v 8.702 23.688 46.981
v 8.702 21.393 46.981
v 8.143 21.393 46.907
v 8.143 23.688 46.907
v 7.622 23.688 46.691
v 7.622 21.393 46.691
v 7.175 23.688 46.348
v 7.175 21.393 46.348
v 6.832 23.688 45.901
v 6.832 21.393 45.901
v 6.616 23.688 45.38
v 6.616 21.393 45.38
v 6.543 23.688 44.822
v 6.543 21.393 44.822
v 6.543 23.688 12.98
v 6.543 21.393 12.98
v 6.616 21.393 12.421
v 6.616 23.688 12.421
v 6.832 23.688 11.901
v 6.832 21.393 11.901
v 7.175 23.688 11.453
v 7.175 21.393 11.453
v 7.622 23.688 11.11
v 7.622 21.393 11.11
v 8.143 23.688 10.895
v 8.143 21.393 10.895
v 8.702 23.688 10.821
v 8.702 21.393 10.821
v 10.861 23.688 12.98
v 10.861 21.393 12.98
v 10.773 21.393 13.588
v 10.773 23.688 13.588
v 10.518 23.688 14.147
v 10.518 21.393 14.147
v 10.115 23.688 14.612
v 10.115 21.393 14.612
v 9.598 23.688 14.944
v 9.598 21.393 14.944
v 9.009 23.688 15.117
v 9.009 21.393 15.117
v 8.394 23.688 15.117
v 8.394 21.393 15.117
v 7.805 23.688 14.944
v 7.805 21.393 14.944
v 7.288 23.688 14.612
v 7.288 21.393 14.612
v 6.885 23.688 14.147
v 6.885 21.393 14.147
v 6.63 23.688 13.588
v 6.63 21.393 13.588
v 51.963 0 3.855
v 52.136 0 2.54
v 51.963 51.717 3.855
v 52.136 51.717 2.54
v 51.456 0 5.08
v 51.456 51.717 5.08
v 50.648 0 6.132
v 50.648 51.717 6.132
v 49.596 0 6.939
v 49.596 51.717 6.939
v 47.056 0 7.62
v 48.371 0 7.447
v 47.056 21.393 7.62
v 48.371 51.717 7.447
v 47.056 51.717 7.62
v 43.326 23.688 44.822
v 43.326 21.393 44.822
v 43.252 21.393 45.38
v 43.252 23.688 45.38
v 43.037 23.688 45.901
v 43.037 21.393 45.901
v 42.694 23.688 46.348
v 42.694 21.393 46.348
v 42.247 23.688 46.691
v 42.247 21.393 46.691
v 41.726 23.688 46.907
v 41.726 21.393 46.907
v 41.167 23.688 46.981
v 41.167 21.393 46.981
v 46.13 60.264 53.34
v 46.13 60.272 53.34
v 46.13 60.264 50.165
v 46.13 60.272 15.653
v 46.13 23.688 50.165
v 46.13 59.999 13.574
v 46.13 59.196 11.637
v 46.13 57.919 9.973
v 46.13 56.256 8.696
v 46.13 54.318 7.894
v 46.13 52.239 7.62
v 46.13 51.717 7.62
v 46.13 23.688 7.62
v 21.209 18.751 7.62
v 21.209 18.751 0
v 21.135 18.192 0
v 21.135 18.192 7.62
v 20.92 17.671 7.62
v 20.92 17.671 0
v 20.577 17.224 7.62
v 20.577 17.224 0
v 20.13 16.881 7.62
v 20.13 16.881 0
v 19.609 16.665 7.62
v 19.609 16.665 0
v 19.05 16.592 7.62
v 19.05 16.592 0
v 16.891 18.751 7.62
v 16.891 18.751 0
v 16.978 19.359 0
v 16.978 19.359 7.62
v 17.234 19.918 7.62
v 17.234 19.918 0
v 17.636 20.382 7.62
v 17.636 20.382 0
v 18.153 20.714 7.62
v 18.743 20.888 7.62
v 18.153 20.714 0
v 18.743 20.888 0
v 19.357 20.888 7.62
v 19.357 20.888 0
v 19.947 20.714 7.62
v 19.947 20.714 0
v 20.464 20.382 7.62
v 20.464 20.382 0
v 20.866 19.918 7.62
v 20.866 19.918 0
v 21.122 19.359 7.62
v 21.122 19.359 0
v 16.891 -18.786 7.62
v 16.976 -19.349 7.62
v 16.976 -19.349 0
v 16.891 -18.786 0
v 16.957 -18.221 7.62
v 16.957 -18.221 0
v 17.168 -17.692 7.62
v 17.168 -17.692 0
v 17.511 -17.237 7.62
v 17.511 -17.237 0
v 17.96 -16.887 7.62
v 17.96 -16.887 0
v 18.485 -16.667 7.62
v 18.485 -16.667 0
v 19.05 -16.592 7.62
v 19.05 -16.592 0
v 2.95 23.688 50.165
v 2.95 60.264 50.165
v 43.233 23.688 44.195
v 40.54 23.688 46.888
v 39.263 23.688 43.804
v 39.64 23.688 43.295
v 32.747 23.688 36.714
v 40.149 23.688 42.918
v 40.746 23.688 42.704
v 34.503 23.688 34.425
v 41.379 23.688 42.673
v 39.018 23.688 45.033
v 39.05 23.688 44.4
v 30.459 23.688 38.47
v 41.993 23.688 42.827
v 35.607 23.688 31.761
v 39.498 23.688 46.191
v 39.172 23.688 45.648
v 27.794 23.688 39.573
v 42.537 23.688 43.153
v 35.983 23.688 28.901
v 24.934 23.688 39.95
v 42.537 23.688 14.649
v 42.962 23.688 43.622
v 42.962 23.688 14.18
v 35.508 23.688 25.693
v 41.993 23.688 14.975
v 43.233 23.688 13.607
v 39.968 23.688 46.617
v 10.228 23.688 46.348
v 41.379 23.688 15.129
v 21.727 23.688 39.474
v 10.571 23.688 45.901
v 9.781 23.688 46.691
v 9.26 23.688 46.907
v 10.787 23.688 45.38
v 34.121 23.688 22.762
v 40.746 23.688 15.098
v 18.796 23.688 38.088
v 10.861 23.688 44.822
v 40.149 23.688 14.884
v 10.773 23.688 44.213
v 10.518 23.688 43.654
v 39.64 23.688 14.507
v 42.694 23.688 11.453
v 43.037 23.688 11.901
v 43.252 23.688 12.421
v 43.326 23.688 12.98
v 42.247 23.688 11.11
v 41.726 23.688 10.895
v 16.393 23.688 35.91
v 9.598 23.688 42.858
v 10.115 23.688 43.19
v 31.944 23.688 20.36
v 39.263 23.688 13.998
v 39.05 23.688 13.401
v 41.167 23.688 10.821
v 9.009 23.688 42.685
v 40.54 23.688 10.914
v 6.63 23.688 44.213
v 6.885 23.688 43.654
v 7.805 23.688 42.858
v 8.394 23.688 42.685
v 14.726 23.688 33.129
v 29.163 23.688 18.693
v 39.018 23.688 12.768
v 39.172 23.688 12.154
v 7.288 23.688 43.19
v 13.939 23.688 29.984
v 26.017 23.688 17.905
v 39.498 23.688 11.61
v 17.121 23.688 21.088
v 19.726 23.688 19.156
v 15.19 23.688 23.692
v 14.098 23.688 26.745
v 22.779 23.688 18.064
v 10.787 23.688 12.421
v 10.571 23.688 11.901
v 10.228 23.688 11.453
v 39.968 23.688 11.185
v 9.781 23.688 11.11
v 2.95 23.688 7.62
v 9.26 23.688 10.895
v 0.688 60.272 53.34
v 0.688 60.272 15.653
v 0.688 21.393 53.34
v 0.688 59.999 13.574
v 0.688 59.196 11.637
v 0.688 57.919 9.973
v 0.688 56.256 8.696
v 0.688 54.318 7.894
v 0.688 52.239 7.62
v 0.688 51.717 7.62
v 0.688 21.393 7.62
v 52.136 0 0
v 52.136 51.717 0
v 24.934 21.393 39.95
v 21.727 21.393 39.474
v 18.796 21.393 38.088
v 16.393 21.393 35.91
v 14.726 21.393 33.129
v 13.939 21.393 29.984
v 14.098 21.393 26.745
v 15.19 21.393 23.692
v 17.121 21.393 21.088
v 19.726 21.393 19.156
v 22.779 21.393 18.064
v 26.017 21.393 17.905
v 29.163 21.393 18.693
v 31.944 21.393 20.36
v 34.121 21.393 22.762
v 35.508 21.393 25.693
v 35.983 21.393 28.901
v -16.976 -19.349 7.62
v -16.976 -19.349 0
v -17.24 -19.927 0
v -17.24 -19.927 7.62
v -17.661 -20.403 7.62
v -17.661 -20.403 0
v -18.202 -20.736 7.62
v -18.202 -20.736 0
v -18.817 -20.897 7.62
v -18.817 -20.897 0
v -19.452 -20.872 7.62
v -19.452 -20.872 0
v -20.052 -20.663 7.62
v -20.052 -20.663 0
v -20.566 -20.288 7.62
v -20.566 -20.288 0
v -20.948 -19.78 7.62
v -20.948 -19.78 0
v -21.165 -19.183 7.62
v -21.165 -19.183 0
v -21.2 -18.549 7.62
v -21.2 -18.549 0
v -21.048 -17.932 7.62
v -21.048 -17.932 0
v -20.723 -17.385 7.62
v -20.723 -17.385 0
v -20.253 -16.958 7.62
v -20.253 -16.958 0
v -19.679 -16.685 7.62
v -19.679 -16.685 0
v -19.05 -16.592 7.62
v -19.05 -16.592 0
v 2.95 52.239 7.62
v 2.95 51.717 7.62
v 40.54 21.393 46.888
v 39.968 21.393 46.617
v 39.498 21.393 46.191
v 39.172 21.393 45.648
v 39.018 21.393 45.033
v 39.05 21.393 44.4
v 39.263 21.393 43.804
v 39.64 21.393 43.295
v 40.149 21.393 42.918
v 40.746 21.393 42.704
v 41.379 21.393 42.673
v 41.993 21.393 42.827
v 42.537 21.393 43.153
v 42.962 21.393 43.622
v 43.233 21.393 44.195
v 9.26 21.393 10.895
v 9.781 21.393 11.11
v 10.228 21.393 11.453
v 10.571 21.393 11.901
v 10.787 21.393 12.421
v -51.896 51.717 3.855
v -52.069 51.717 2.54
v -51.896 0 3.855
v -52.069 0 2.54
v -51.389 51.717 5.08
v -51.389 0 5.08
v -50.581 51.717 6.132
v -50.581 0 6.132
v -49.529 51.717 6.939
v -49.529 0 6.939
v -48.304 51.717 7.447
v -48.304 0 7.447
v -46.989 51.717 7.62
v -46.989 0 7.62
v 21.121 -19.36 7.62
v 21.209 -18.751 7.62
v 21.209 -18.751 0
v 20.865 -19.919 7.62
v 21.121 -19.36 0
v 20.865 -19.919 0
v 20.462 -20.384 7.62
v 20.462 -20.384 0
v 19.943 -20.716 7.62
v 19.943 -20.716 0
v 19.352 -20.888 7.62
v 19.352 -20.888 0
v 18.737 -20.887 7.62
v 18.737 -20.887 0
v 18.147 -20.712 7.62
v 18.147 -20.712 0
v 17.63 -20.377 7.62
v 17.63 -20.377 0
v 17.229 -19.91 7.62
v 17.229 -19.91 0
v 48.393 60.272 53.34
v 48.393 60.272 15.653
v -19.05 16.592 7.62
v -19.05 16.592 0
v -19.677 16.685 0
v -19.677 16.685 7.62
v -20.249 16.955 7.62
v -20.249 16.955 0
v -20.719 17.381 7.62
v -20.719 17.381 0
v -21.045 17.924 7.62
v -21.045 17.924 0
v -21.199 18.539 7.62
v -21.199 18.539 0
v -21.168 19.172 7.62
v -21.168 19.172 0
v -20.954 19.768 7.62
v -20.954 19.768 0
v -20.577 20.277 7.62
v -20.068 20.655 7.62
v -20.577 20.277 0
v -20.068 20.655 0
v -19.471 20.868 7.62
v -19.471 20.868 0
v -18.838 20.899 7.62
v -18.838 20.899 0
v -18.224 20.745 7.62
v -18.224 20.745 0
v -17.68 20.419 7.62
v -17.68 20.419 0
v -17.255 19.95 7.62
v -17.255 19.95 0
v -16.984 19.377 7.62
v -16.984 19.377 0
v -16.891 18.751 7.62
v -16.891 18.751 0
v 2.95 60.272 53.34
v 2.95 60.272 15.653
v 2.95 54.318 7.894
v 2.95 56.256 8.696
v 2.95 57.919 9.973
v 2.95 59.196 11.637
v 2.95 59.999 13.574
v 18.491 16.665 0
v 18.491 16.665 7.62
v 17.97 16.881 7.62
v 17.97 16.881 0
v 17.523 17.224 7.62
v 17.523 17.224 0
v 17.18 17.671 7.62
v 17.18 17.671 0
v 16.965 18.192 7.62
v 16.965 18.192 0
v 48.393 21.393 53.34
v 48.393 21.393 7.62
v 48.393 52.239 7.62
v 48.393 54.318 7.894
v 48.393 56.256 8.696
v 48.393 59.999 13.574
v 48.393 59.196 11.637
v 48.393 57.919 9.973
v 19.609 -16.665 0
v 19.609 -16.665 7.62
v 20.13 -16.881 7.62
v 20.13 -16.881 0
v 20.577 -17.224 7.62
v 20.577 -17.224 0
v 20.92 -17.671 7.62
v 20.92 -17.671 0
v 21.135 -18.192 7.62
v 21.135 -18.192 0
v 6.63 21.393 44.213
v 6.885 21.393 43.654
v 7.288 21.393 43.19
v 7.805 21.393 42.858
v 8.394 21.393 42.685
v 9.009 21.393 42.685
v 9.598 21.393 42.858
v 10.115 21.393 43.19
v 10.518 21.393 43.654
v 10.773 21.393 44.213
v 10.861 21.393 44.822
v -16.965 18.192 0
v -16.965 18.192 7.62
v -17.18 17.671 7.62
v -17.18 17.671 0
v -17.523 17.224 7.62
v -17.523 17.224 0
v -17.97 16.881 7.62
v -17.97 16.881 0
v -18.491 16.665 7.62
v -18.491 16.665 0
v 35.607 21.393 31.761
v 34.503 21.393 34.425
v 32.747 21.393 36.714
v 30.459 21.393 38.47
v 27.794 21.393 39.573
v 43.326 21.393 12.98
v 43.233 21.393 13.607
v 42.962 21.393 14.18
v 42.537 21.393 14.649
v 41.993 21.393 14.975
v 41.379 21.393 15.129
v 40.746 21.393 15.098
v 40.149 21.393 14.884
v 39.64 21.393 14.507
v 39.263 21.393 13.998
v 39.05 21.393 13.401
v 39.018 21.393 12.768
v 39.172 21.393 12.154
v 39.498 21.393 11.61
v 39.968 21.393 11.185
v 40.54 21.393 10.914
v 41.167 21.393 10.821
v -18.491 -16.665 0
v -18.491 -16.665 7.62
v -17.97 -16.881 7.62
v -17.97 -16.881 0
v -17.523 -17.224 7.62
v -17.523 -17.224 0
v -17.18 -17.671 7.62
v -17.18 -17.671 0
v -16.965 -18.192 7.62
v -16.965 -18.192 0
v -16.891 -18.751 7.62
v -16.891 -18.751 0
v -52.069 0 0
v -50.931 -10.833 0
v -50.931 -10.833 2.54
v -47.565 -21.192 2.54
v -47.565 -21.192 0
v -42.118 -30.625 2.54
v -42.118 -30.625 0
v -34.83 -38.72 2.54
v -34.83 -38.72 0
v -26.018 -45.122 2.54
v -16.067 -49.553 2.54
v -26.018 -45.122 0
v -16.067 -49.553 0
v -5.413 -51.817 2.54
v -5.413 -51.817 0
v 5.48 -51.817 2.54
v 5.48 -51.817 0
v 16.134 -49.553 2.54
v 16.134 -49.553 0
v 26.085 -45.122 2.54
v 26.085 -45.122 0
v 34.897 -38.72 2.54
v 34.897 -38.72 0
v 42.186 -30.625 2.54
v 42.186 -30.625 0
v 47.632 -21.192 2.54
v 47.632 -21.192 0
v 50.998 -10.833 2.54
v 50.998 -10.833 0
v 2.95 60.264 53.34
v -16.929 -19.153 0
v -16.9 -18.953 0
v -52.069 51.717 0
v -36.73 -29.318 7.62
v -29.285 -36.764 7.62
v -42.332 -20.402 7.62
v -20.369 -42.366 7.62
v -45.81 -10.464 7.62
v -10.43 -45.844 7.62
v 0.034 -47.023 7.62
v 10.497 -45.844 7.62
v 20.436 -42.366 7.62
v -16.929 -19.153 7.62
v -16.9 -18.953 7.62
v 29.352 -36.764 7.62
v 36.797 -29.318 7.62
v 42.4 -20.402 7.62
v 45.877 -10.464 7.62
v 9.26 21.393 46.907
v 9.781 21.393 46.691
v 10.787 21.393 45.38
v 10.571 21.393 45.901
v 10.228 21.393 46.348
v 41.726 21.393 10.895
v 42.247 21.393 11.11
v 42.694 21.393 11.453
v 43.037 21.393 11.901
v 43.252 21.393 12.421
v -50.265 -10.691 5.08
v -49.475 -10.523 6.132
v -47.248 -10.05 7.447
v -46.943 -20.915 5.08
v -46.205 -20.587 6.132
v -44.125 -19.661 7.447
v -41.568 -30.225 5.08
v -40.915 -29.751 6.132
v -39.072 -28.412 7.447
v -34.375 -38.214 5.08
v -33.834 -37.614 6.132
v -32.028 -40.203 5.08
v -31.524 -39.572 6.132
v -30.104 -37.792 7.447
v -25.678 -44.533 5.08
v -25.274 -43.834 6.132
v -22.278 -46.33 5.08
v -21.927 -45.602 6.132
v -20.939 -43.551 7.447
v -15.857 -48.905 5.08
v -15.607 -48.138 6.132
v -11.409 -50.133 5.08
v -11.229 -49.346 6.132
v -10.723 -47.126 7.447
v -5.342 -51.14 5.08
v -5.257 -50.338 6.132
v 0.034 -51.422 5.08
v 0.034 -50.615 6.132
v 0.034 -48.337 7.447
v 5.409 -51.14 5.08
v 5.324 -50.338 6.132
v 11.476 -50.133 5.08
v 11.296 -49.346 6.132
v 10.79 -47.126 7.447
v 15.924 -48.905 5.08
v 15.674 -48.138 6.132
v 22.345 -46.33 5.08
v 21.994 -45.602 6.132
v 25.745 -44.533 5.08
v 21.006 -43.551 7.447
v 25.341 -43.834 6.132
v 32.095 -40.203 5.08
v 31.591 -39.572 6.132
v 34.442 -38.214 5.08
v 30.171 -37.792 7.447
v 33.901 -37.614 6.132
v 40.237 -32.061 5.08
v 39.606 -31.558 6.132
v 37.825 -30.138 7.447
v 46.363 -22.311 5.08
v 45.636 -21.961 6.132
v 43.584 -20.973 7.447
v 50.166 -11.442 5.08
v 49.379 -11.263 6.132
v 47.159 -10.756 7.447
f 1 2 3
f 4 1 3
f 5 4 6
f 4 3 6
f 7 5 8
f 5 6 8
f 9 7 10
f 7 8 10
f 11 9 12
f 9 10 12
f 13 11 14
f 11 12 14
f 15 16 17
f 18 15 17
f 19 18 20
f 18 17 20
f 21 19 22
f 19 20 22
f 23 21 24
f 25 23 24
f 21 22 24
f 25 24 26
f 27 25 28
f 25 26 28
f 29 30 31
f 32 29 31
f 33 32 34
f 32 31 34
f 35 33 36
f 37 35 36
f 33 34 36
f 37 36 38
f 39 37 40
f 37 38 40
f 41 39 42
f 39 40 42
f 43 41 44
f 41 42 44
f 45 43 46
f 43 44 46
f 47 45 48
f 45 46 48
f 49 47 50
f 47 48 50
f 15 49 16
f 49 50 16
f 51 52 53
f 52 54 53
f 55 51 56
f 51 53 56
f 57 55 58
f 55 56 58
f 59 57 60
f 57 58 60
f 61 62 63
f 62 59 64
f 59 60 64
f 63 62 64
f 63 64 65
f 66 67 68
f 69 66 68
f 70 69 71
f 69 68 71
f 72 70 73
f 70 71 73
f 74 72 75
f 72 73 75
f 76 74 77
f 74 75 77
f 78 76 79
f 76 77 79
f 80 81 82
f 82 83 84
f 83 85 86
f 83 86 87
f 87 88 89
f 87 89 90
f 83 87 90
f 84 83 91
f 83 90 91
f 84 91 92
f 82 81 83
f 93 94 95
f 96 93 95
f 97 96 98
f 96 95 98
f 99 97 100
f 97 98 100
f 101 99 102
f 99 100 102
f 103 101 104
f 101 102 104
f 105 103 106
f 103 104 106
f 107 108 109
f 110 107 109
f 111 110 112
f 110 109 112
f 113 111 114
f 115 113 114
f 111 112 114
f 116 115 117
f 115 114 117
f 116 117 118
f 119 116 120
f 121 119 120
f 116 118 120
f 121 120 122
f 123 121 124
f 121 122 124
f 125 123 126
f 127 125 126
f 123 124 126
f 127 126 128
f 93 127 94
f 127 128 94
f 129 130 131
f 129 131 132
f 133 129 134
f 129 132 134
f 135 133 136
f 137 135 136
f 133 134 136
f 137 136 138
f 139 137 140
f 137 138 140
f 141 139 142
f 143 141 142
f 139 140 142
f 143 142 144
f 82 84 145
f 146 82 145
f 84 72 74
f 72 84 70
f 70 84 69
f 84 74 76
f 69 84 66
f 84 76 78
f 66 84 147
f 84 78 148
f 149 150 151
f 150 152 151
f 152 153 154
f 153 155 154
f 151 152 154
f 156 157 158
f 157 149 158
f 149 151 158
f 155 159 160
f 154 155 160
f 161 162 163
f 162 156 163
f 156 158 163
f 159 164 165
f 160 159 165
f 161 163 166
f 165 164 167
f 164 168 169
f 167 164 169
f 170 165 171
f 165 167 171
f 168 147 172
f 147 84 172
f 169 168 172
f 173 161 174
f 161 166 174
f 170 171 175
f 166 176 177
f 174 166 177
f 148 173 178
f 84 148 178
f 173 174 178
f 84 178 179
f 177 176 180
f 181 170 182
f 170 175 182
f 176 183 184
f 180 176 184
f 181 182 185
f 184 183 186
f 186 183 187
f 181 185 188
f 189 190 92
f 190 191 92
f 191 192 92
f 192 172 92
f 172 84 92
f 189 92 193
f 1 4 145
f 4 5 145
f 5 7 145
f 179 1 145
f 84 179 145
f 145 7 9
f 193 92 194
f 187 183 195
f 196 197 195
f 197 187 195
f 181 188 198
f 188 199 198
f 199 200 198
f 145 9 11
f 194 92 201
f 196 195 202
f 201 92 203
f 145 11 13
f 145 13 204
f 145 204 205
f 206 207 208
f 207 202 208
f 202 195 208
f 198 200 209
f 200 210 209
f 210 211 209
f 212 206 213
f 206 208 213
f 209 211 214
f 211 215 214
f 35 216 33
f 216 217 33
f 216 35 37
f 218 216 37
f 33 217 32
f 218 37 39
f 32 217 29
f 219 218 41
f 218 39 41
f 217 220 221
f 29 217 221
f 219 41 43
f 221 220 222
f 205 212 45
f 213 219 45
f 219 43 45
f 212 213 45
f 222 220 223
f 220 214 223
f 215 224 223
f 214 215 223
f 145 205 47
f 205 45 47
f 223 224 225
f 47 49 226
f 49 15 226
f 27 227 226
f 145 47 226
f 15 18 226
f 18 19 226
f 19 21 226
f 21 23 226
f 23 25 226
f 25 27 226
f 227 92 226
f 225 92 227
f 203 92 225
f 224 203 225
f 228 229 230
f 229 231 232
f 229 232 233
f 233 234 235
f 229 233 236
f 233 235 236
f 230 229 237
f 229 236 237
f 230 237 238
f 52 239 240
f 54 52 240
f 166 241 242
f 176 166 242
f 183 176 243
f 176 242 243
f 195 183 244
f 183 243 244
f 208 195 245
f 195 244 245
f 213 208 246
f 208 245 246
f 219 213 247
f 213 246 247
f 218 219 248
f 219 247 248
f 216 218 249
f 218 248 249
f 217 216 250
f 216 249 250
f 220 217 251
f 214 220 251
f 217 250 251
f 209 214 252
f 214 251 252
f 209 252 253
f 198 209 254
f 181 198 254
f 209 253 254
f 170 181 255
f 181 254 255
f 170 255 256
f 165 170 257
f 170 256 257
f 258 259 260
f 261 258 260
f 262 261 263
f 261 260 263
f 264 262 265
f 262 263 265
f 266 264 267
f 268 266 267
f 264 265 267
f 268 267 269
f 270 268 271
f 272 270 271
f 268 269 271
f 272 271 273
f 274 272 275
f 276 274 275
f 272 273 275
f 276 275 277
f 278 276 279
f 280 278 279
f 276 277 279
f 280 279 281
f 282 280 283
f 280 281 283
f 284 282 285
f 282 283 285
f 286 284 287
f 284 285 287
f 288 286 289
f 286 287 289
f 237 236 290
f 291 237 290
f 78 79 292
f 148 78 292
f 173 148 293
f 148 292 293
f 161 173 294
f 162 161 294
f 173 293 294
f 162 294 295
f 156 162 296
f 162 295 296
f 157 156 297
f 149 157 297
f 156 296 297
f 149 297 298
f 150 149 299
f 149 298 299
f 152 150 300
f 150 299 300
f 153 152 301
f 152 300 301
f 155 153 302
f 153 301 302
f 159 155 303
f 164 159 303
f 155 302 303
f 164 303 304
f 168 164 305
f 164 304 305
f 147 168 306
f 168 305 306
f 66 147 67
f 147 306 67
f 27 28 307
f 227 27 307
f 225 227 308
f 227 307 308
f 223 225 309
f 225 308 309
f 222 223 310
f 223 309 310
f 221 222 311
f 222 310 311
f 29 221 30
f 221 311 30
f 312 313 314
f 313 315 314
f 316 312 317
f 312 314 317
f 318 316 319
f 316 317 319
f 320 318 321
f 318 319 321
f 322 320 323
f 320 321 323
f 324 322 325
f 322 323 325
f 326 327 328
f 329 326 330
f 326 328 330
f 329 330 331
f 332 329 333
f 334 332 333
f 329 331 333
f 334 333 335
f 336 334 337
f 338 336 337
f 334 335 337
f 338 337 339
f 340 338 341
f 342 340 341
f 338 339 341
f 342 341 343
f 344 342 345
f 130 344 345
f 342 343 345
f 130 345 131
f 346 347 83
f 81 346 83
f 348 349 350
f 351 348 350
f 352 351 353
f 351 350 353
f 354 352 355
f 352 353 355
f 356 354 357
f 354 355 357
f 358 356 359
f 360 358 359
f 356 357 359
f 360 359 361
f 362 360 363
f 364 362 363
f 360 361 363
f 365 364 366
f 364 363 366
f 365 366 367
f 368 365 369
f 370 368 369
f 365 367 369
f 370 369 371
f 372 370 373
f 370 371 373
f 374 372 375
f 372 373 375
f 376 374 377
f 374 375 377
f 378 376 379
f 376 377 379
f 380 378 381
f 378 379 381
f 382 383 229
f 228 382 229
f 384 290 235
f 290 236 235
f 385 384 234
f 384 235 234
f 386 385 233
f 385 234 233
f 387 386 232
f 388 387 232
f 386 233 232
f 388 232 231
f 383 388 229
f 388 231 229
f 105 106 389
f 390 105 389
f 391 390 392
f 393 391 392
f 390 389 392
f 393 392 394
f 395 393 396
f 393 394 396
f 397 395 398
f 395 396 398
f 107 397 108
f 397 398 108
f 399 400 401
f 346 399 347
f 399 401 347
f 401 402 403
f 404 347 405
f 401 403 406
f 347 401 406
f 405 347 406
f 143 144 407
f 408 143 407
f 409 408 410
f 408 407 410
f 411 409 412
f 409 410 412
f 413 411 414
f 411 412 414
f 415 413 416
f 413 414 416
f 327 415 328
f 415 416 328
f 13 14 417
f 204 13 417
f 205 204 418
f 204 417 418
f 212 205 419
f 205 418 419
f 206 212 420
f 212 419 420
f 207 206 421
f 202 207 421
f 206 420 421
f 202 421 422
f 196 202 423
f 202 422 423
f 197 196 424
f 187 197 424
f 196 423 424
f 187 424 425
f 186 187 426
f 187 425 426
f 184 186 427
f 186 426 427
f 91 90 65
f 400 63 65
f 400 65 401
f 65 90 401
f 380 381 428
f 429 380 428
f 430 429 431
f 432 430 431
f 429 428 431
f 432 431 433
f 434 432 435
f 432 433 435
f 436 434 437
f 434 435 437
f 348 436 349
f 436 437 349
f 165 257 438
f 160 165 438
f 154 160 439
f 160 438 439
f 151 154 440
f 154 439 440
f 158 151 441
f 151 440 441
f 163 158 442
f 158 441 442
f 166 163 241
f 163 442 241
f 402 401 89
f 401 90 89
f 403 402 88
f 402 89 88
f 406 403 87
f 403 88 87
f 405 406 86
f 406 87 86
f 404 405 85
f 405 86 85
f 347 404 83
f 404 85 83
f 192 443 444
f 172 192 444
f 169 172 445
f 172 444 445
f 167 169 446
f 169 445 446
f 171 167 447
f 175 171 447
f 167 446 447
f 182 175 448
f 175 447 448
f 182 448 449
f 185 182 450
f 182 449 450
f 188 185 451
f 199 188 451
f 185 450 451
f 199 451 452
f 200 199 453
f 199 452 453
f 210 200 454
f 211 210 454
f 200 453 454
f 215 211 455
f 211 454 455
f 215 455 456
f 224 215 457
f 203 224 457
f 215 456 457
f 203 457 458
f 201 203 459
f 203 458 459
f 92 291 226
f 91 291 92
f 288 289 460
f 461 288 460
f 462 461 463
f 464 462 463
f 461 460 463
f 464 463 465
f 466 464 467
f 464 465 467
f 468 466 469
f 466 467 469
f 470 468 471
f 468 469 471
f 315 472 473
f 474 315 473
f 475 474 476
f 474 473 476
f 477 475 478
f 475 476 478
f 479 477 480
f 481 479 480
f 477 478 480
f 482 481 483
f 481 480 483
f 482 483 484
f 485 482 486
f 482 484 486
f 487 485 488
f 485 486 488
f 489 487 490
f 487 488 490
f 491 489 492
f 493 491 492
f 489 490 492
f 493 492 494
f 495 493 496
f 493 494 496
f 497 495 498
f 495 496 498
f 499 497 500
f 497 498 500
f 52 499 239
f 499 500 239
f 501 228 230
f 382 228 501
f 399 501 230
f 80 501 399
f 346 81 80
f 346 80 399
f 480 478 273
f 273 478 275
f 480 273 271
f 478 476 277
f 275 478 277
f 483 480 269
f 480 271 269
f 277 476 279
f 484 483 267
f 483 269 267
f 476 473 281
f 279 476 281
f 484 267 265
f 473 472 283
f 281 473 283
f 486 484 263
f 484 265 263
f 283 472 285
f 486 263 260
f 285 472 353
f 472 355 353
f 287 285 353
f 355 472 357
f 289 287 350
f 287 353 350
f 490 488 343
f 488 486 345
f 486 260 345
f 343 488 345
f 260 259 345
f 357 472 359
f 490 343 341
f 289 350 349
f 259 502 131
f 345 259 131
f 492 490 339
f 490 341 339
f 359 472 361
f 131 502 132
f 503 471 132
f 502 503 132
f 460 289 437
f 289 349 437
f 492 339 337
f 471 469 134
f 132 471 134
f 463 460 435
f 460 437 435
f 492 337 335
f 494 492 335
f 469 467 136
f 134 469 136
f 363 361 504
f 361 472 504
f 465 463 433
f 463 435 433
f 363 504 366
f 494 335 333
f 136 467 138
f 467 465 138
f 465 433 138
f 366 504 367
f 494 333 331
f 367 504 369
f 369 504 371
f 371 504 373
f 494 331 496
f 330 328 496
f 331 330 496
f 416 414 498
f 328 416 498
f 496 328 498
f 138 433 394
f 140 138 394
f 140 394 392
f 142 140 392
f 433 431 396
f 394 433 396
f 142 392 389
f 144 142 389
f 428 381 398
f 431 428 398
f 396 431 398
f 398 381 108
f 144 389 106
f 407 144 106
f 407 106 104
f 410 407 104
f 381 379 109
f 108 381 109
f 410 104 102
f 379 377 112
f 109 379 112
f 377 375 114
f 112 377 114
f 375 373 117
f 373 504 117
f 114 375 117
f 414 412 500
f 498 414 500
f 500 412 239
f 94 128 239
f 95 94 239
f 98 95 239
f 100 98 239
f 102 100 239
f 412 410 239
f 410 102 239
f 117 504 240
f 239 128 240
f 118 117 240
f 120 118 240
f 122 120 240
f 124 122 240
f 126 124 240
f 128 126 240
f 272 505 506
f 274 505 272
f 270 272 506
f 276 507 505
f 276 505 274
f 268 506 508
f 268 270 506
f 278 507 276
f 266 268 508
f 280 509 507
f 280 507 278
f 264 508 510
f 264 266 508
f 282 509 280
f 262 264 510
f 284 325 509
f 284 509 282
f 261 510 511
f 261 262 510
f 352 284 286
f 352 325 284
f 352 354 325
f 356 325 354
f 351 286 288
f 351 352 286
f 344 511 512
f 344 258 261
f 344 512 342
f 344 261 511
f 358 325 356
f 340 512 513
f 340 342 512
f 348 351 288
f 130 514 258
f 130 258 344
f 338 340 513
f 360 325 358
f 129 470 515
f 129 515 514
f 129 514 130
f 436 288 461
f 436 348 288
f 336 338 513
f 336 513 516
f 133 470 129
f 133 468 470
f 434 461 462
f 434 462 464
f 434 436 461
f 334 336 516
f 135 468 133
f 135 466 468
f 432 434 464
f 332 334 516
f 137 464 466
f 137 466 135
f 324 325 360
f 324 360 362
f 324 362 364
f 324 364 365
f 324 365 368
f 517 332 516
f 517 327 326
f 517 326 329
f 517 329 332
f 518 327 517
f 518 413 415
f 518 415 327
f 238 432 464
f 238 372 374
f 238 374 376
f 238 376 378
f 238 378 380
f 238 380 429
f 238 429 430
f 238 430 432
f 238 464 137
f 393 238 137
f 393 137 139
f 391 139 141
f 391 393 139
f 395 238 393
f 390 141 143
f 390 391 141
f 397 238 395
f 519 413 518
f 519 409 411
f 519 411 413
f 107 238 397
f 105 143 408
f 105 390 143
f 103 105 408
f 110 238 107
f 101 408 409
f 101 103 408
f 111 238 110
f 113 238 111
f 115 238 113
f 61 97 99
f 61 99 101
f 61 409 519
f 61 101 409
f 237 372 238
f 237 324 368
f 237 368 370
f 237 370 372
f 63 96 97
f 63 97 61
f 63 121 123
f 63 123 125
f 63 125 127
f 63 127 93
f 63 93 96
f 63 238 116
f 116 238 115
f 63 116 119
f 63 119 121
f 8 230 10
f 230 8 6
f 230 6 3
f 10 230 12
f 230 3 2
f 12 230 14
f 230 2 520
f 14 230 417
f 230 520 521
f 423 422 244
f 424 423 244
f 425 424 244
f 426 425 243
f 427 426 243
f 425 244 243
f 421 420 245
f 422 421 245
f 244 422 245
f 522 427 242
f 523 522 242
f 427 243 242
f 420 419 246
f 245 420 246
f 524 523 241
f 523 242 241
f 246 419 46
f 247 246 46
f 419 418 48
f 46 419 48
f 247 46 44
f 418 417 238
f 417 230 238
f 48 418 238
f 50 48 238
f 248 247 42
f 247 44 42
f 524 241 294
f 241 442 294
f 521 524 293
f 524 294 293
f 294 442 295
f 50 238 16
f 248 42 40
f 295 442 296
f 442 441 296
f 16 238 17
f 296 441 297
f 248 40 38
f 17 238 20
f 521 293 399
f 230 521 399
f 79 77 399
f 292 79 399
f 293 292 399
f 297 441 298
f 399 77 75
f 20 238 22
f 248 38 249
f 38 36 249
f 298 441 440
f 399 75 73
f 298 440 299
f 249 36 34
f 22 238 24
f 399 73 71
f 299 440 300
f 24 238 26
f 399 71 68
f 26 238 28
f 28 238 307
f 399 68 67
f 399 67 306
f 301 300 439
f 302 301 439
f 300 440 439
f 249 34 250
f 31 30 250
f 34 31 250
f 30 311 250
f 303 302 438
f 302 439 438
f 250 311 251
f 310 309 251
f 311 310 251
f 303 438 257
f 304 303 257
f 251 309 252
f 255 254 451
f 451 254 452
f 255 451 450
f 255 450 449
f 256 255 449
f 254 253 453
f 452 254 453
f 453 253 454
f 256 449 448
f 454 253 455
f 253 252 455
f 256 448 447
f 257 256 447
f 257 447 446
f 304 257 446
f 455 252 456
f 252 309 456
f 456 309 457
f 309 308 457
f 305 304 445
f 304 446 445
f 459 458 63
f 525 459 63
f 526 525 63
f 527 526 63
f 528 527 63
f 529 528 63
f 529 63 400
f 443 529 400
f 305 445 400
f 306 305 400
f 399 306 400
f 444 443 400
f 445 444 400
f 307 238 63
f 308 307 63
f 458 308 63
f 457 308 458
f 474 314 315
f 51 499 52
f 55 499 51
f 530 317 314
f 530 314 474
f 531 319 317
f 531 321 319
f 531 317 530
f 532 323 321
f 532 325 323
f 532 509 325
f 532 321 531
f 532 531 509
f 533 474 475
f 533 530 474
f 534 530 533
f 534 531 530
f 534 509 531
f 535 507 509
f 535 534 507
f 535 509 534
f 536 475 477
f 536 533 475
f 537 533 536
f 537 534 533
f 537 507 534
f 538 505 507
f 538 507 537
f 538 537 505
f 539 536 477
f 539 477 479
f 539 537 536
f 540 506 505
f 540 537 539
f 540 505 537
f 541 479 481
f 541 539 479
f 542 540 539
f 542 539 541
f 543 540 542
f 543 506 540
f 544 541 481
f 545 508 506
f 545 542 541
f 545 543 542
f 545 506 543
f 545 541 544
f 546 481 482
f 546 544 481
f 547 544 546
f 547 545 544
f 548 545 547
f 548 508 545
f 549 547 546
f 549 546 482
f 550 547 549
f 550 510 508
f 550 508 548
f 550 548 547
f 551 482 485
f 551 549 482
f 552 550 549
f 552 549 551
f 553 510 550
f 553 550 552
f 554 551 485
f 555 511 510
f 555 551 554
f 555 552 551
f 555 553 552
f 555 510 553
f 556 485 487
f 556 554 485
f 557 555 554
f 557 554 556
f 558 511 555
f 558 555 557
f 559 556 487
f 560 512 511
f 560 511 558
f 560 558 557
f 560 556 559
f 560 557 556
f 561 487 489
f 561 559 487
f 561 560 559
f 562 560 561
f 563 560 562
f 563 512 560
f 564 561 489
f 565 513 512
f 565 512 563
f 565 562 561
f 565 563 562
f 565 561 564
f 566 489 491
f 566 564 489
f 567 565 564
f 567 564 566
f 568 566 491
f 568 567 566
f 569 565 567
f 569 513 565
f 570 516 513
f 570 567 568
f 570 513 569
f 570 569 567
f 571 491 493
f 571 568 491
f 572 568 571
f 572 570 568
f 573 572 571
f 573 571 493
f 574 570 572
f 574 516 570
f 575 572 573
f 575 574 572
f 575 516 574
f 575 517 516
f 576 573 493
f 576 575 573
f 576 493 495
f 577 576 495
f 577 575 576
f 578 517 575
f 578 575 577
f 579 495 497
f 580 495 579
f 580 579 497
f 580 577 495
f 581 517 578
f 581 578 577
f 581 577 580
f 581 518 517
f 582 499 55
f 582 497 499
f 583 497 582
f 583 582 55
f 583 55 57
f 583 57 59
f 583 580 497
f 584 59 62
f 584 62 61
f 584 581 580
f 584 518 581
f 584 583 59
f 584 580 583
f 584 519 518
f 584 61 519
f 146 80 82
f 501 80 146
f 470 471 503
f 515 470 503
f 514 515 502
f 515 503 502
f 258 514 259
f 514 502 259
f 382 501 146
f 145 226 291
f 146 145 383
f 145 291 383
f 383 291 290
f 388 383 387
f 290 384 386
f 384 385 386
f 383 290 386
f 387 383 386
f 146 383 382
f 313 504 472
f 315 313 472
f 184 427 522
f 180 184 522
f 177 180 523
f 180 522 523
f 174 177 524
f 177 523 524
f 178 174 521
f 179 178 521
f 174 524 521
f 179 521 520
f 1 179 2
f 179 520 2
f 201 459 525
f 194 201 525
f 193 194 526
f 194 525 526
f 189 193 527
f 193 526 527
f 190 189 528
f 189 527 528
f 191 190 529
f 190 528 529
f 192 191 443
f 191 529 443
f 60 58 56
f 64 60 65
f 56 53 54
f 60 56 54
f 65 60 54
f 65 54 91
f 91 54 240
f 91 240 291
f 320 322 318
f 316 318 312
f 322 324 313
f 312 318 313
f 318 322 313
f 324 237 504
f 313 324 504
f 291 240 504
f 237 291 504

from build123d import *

# Parameters (mm, degrees)
F1_DEPTH = 7.62
F2_R     = 5.08
F4_DEPTH = 45.72
F6_DEPTH = 25.4
F7_W     = 43.18
F7_H     = 3.175
F8_DEPTH = 36.576
F9_R     = 8.0330542074


with BuildPart() as f1:
    # F0 (on Top) → F1 (new body)
    with BuildSketch(Plane.XY):
        with BuildLine():
            ThreePointArc((-19.05, 16.5915609938), (-20.5766435406, 20.2772045344), (-16.891, 18.7505609938))
            Line((-16.891, 18.7505609938), (16.891, 18.7505609938))
            ThreePointArc((16.891, 18.7505609938), (19.05, 20.9095609938), (21.209, 18.7505609938))
            ThreePointArc((21.209, 18.7505609938), (20.5766435406, 17.2239174532), (19.05, 16.5915609938))
            Line((19.05, 16.5915609938), (19.05, 0))
            Line((19.05, 0), (52.1362312138, 0))
            Line((52.1362312138, 0), (52.1362312138, 51.7165437341))
            Line((52.1362312138, 51.7165437341), (-52.0691390008, 51.7165437341))
            Line((-52.0691390008, 51.7165437341), (-52.0691390008, 0))
            Line((-52.0691390008, 0), (-19.05, 0))
            Line((-19.05, 0), (-19.05, 16.5915609938))
        make_face()
        with BuildLine():
            Line((-19.05, -16.5915609938), (-19.05, 0))
            Line((-19.05, 0), (-52.0691390008, 0))
            ThreePointArc((-52.0691390008, 0), (0.0335461065, -52.1026851073), (52.1362312138, 0))
            Line((52.1362312138, 0), (19.05, 0))
            Line((19.05, 0), (19.05, -16.5915609938))
            ThreePointArc((19.05, -16.5915609938), (20.5766435406, -17.2239174532), (21.209, -18.7505609938))
            ThreePointArc((21.209, -18.7505609938), (19.3524205753, -20.8882753797), (16.975722746, -19.3494390062))
            Line((16.975722746, -19.3494390062), (-16.975722746, -19.3494390062))
            ThreePointArc((-16.975722746, -19.3494390062), (-20.775435978, -20.0483096928), (-19.05, -16.5915609938))
        make_face()
        with BuildLine():
            Line((16.891, 18.7505609938), (-16.891, 18.7505609938))
            ThreePointArc((-16.891, 18.7505609938), (-17.5233564594, 17.2239174532), (-19.05, 16.5915609938))
            Line((-19.05, 16.5915609938), (-19.05, 0))
            Line((-19.05, 0), (19.05, 0))
            Line((19.05, 0), (19.05, 16.5915609938))
            ThreePointArc((19.05, 16.5915609938), (17.5233564594, 17.2239174532), (16.891, 18.7505609938))
        make_face()
        with BuildLine():
            Line((19.05, 0), (-19.05, 0))
            Line((-19.05, 0), (-19.05, -16.5915609938))
            ThreePointArc((-19.05, -16.5915609938), (-17.5233564594, -17.2239174532), (-16.891, -18.7505609938))
            ThreePointArc((-16.891, -18.7505609938), (-16.9122856141, -19.0529815691), (-16.975722746, -19.3494390062))
            Line((-16.975722746, -19.3494390062), (16.975722746, -19.3494390062))
            ThreePointArc((16.975722746, -19.3494390062), (17.324564022, -17.4528122949), (19.05, -16.5915609938))
            Line((19.05, -16.5915609938), (19.05, 0))
        make_face()
    extrude(amount=F1_DEPTH)

    # F2
    f2_edges = [f1.edges().sort_by_distance(p)[0] for p in [
        (0.033546, -52.102685, 7.62),
    ]]
    fillet(f2_edges, radius=F2_R)

    # F3 (on face) → F4 (join)
    with BuildSketch(Plane.XY.offset(7.62)):
        Polygon((46.1304020137, 23.6876853067), (2.9504020137, 23.6876853067), (2.9504020137, 57.9776853067), (2.9504020137, 60.2722298354), (0.6876643932, 60.2722298354), (0.6876643932, 21.3931407779), (48.3931396341, 21.3931407779), (48.3931396341, 60.2722298354), (46.1304020137, 60.2722298354), (46.1304020137, 57.9776853067), align=None)
    extrude(amount=F4_DEPTH)

    # F5 (on face) → F6 (cut)
    with BuildSketch(Plane.XZ.offset(-21.3931407779)):
        with BuildLine():
            ThreePointArc((6.5425638128, 44.8215786717), (8.7015638128, 42.6625786717), (10.8605638128, 44.8215786717))
            ThreePointArc((10.8605638128, 44.8215786717), (10.2282073534, 46.3482222123), (8.7015638128, 46.9805786717))
            ThreePointArc((8.7015638128, 46.9805786717), (7.1749202722, 46.3482222123), (6.5425638128, 44.8215786717))
        make_face()
        with BuildLine():
            ThreePointArc((24.9343014333, 39.9498267307), (17.1214786079, 21.0880039054), (35.9833014333, 28.9008267307))
            ThreePointArc((35.9833014333, 28.9008267307), (32.7471242586, 36.7136495561), (24.9343014333, 39.9498267307))
        make_face()
        with BuildLine():
            ThreePointArc((41.1670390537, 46.9805786717), (39.6403955132, 43.2949351311), (43.3260390537, 44.8215786717))
            ThreePointArc((43.3260390537, 44.8215786717), (42.6936825943, 46.3482222123), (41.1670390537, 46.9805786717))
        make_face()
        with BuildLine():
            ThreePointArc((41.1670390537, 10.8210747898), (42.6936825943, 11.4534312492), (43.3260390537, 12.9800747898))
            ThreePointArc((43.3260390537, 12.9800747898), (39.6403955132, 14.5067183303), (41.1670390537, 10.8210747898))
        make_face()
        with BuildLine():
            ThreePointArc((6.5425638128, 12.9800747898), (7.1749202722, 11.4534312492), (8.7015638128, 10.8210747898))
            ThreePointArc((8.7015638128, 10.8210747898), (10.2282073534, 11.4534312492), (10.8605638128, 12.9800747898))
            ThreePointArc((10.8605638128, 12.9800747898), (8.7015638128, 15.1390747898), (6.5425638128, 12.9800747898))
        make_face()
    extrude(amount=-F6_DEPTH, mode=Mode.SUBTRACT)

    # F7 (on face) → F8 (join)
    with BuildSketch(Plane(origin=(0, 23.6876853067, 0), x_dir=(-1, 0, 0), z_dir=(0, 1, 0))):
        with Locations((-24.5404020137, 51.7525)):
            Rectangle(F7_W, F7_H)
    extrude(amount=F8_DEPTH)

    # F9
    f9_edges = [f1.edges().sort_by_distance(p)[0] for p in [
        (47.261771, 60.27223, 7.62),
        (1.819033, 60.27223, 7.62),
    ]]
    fillet(f9_edges, radius=F9_R)


solid = f1.part
